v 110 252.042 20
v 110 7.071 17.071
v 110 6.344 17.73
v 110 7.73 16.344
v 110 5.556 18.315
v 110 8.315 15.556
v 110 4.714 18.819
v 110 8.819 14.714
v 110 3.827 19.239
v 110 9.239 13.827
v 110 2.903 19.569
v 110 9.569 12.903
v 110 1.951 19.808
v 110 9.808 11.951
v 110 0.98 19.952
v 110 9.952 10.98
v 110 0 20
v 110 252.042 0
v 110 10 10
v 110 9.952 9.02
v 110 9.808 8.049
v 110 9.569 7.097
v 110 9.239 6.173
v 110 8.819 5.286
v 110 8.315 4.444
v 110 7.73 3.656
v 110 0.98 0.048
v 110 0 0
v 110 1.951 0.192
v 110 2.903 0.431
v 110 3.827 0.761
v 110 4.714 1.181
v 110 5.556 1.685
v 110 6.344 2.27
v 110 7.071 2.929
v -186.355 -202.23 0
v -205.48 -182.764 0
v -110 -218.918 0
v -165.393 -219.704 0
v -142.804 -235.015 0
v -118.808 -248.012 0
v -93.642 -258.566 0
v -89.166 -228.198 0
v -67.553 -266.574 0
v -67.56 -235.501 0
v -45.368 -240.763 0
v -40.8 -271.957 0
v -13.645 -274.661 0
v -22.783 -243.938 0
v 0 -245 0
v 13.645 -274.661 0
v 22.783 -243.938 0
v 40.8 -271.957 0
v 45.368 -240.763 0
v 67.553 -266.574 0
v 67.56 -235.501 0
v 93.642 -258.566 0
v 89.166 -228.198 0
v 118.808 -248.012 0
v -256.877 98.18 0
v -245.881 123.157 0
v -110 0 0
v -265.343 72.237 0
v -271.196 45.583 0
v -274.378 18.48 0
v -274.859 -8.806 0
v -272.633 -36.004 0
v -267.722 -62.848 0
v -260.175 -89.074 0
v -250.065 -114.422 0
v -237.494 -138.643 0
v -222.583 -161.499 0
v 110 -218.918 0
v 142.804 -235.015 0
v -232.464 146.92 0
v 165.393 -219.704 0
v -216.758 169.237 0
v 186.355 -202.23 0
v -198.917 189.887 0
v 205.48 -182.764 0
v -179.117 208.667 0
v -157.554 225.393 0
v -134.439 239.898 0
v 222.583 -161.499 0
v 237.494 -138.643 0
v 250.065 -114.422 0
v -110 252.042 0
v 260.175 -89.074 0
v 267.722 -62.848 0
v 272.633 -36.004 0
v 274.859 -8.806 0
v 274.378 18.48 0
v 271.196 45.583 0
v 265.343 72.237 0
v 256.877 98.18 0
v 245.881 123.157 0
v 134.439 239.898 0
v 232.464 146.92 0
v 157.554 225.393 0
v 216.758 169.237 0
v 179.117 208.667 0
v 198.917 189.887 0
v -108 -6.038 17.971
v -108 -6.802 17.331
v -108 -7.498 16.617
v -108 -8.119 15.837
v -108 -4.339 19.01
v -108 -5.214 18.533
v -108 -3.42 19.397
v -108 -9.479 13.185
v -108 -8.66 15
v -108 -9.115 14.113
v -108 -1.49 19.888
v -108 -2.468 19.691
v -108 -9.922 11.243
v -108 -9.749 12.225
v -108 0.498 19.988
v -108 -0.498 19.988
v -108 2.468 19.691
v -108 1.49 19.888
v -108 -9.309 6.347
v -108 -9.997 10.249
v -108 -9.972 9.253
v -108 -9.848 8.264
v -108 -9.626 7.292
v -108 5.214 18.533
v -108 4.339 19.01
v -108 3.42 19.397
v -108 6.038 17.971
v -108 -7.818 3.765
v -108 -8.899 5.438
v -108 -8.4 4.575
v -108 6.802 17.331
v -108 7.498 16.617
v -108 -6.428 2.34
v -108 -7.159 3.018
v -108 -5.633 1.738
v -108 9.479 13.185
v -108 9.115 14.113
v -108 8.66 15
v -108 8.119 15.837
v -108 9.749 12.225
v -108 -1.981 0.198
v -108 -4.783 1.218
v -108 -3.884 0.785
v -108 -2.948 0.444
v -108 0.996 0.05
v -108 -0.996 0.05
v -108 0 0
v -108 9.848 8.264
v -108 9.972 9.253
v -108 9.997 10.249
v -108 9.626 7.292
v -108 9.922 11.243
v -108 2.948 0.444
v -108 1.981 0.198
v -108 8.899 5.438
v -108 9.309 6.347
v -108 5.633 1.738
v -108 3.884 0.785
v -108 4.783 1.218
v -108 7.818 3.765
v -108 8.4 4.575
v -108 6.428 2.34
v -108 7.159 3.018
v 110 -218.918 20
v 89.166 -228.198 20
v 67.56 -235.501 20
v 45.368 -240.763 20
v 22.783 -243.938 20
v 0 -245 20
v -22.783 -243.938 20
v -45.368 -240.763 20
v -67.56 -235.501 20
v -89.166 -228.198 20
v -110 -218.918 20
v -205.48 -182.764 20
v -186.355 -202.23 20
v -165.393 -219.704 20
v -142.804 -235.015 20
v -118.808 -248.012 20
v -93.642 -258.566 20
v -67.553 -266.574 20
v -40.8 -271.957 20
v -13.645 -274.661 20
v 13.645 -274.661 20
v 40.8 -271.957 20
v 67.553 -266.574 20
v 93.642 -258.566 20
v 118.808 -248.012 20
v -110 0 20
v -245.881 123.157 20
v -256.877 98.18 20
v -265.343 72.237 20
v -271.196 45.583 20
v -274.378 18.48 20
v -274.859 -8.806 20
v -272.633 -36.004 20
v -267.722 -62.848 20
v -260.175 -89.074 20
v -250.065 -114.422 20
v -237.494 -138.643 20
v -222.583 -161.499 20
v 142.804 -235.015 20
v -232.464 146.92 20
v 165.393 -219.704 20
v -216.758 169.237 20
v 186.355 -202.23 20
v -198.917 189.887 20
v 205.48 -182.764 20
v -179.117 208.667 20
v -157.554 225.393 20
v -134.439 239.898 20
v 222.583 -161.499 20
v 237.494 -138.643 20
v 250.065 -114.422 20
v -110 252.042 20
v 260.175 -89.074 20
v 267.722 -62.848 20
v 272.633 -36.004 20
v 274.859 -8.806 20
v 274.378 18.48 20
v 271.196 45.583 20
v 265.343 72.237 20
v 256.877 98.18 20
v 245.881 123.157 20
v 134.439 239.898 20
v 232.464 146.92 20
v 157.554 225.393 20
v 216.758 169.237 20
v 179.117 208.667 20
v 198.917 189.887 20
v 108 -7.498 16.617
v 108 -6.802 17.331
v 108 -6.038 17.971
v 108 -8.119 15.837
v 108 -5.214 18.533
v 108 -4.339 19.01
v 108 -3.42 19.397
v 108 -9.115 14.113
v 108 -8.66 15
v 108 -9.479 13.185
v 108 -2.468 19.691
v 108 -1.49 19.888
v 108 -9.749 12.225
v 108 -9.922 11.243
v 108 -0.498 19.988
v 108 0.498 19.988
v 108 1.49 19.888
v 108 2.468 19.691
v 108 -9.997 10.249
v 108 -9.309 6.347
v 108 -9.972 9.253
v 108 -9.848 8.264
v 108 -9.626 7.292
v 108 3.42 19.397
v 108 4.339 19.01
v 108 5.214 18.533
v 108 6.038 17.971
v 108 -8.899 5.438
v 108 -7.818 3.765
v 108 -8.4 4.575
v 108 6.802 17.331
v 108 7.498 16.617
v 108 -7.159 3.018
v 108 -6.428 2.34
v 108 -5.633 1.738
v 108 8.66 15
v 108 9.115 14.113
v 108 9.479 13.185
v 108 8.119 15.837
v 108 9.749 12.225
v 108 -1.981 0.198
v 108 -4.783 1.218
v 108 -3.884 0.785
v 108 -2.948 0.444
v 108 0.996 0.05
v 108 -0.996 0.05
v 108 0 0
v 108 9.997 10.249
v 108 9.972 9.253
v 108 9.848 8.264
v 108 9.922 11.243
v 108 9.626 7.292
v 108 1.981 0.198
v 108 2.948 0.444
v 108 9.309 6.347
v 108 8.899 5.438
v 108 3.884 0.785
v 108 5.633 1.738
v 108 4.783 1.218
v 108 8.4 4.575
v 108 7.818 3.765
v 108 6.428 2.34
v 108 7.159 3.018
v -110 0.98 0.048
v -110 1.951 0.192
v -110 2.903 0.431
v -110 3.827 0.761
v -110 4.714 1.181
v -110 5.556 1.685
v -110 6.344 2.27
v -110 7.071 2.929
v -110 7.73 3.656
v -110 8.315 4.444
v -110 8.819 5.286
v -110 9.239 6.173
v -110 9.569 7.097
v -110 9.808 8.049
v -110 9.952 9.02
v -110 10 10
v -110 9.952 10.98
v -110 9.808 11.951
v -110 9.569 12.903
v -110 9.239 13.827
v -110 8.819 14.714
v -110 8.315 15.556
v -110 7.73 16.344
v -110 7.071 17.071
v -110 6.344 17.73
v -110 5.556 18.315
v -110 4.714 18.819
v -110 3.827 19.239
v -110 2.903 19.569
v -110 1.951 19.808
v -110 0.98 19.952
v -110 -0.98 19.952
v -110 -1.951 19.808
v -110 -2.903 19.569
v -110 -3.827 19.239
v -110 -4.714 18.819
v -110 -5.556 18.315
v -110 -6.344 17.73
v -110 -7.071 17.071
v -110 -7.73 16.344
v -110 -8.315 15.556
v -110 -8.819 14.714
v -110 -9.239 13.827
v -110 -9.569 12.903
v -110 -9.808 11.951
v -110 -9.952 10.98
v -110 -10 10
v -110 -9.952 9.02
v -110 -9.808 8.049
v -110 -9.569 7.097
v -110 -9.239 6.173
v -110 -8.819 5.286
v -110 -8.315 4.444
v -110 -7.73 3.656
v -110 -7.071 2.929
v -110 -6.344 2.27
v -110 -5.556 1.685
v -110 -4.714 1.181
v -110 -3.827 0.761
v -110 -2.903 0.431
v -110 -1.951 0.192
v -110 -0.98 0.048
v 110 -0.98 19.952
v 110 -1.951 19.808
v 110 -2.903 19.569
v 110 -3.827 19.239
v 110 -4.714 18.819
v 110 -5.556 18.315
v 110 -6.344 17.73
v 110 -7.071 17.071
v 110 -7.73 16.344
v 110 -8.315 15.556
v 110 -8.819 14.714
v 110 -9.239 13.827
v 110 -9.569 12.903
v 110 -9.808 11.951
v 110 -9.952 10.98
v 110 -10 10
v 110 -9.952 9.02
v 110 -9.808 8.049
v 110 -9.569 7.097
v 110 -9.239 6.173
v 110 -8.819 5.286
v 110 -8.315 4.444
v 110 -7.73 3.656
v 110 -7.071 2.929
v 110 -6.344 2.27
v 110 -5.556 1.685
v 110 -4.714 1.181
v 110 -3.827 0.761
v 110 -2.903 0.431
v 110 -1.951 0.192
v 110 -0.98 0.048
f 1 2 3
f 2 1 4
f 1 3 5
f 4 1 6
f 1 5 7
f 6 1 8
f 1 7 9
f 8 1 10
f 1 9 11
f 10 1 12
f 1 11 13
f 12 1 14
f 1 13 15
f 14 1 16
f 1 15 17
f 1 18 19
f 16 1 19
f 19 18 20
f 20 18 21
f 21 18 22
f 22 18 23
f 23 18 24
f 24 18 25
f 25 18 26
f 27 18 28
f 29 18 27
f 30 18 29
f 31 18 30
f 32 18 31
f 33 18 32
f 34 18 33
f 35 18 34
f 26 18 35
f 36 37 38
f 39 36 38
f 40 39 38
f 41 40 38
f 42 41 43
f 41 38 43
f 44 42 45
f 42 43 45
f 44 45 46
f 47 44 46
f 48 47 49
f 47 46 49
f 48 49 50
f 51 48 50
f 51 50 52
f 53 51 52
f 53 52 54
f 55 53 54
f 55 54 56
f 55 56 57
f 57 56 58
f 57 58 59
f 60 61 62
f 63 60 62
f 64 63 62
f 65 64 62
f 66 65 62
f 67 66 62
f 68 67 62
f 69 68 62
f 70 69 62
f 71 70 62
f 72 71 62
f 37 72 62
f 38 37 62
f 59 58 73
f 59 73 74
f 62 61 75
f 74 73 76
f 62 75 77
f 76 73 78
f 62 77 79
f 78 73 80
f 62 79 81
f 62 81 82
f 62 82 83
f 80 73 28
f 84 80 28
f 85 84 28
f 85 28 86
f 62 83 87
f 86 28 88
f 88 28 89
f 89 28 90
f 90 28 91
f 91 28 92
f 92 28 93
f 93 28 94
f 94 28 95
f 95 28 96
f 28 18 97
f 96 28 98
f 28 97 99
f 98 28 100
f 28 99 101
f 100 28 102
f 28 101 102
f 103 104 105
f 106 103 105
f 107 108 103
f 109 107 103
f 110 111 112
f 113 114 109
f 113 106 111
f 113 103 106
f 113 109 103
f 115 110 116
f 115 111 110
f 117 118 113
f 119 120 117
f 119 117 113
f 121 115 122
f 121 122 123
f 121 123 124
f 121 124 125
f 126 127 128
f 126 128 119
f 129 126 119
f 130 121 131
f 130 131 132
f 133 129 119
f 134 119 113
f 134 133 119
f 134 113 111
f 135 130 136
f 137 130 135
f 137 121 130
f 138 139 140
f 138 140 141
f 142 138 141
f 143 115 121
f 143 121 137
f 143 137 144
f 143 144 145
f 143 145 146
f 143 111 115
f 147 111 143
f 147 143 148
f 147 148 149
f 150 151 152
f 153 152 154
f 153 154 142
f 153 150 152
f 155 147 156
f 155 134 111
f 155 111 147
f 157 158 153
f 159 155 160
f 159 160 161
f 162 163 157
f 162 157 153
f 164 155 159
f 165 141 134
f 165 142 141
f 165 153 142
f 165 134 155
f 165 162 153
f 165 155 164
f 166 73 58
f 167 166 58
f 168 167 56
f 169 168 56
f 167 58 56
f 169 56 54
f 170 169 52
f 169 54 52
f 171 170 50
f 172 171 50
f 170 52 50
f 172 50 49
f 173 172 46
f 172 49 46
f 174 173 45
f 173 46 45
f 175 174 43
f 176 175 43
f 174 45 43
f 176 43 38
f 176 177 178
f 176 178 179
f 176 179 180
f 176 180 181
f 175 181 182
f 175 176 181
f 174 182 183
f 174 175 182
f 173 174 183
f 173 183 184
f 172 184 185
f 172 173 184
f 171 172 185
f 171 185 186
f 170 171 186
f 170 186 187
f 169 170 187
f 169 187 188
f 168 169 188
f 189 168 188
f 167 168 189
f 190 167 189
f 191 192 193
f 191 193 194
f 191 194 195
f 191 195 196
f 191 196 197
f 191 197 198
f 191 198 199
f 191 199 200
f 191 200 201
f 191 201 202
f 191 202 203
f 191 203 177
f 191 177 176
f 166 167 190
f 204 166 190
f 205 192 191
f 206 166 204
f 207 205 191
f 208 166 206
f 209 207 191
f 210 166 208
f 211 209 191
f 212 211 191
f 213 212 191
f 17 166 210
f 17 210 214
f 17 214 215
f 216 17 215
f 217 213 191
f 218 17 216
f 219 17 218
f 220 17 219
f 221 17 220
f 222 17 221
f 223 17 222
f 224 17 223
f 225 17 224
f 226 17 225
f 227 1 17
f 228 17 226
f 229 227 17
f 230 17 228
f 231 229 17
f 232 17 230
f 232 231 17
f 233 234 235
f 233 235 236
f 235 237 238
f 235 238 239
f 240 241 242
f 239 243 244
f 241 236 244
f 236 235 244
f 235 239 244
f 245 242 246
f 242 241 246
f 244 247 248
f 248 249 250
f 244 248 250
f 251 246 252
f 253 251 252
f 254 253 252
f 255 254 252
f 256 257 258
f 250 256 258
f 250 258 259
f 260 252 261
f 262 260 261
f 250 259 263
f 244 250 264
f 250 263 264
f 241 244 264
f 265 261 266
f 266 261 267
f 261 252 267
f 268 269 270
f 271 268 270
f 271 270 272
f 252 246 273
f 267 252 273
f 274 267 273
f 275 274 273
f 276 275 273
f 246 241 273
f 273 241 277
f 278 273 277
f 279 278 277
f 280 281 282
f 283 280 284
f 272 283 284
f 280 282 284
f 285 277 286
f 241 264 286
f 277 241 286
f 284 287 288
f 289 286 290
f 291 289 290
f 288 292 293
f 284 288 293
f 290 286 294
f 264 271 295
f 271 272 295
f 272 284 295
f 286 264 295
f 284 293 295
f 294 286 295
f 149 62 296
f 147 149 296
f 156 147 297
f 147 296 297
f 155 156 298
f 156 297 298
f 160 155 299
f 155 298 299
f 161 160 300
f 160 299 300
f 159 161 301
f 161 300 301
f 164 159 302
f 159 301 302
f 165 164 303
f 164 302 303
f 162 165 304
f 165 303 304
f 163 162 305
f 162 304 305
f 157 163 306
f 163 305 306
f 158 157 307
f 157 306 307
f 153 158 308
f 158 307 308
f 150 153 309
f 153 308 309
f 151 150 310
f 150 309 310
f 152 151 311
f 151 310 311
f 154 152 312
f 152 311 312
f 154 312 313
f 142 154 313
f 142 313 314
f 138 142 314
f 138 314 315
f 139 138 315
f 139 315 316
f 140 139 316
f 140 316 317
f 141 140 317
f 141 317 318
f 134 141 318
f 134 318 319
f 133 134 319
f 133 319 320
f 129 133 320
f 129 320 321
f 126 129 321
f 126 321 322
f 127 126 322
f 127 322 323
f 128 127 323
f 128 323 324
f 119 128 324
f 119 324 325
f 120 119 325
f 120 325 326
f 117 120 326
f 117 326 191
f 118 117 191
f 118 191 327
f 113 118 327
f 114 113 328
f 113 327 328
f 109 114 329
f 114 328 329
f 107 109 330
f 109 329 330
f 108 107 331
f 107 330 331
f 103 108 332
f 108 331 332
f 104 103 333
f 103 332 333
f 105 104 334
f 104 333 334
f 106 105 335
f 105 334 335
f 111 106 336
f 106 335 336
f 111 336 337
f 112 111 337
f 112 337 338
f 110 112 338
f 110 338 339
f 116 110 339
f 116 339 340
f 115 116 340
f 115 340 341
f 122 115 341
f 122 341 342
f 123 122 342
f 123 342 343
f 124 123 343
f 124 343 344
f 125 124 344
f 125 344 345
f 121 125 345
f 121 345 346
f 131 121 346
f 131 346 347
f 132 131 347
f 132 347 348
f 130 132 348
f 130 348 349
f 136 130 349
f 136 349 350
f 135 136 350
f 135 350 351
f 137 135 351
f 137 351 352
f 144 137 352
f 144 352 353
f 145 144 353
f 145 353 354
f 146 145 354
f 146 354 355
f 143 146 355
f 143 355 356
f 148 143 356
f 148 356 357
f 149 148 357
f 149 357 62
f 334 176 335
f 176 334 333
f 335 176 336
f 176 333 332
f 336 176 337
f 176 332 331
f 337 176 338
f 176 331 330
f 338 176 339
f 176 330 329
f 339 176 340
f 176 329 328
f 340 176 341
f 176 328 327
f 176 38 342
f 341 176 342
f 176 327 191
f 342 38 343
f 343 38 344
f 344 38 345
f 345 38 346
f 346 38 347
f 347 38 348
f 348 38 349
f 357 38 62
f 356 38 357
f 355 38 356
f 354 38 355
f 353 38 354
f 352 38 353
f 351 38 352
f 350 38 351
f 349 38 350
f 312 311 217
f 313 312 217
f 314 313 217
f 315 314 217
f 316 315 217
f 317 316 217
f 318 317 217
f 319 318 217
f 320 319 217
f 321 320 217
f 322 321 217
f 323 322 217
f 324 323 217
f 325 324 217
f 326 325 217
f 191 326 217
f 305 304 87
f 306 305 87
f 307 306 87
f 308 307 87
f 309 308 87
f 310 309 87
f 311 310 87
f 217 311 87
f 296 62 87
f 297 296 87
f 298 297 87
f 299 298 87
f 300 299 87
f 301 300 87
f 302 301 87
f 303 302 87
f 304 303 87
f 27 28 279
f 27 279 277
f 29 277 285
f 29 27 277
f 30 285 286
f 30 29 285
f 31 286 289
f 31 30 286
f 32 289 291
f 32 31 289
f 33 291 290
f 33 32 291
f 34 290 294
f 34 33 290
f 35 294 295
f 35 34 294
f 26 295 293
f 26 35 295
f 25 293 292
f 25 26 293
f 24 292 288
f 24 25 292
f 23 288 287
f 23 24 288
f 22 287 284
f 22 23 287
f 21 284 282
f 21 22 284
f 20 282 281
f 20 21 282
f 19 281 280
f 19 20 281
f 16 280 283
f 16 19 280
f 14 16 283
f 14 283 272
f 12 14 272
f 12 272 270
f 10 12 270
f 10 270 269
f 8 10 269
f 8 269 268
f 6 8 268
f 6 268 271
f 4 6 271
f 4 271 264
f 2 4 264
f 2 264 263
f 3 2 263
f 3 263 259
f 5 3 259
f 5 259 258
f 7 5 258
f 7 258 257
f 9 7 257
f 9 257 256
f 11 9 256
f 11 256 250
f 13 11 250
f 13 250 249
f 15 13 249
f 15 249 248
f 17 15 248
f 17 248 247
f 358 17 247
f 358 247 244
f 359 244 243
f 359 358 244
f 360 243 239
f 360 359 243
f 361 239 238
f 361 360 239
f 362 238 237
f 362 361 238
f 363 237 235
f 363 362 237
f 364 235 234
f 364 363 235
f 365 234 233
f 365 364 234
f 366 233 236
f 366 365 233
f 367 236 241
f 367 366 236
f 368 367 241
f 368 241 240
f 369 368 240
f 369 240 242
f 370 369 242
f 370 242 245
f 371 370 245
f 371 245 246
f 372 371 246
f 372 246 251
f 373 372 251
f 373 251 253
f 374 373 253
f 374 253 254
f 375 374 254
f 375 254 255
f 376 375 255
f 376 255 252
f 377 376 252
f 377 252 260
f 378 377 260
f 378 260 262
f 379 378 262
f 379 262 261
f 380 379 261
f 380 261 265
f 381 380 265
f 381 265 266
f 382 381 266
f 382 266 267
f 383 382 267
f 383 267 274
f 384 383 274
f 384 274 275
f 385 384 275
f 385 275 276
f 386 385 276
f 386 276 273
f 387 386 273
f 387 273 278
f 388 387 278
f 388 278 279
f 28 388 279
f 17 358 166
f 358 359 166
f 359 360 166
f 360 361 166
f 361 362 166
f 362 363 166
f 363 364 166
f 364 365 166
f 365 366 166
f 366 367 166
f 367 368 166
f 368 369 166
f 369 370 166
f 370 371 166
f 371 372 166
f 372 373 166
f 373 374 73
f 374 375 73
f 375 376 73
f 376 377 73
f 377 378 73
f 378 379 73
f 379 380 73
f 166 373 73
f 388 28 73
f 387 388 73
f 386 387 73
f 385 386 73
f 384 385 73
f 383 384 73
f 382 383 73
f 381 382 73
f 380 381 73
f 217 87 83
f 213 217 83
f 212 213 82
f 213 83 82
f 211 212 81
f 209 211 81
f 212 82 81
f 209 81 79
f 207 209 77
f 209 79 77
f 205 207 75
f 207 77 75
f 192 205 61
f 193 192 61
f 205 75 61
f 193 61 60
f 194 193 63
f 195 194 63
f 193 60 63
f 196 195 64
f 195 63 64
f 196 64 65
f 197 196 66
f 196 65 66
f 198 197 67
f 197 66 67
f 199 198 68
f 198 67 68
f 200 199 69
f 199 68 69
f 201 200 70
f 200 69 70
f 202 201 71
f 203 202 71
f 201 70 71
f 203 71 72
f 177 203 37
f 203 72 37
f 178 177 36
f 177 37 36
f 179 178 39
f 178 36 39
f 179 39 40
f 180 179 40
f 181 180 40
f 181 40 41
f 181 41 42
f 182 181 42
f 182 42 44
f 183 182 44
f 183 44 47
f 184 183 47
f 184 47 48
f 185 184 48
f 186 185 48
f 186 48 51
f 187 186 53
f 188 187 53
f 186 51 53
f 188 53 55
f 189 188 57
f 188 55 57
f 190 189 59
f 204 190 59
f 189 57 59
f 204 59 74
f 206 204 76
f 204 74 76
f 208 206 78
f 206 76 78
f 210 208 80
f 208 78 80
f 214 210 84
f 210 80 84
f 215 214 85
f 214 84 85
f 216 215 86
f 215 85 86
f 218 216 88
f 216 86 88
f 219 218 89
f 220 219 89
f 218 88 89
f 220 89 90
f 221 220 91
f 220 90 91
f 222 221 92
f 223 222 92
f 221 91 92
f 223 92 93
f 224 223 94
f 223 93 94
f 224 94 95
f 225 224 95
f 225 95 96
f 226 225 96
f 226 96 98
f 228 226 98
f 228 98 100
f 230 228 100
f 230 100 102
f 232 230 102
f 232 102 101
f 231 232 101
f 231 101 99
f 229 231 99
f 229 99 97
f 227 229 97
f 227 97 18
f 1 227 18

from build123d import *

# Parameters (mm, degrees)
AUFSATZ_LINEAR_AUSTRAGEN1_DEPTH = 20
SKIZZE2_R                       = 10
AUFSATZ_LINEAR_AUSTRAGEN2_DEPTH = 2


with BuildPart() as part:
    # Skizze1 → Aufsatz-Linear austragen1 (new body)
    with BuildSketch(Plane.XY):
        with BuildLine():
            ThreePointArc((-110, 252.041663223), (0, -275), (110, 252.041663223))
            Line((110, 252.041663223), (110, -218.91779279))
            ThreePointArc((110, -218.91779279), (0, -245), (-110, -218.91779279))
            Line((-110, -218.91779279), (-110, 252.041663223))
        make_face()
    extrude(amount=AUFSATZ_LINEAR_AUSTRAGEN1_DEPTH)

    # Skizze2 → Aufsatz-Linear austragen2 (add)
    with BuildSketch(Plane(origin=(-110, 0, 0), x_dir=(0, 0, -1), z_dir=(1, 0, 0))):
        with Locations((-10, 0)):
            Circle(SKIZZE2_R)
    aufsatz_linear_austragen2 = extrude(amount=AUFSATZ_LINEAR_AUSTRAGEN2_DEPTH)

    # Spiegeln1: Aufsatz-Linear austragen2 across plane
    add(aufsatz_linear_austragen2.mirror(Plane(origin=(0, 0, 0), x_dir=(0, 0, 1), z_dir=(1, 0, 0))))


solid = part.part
